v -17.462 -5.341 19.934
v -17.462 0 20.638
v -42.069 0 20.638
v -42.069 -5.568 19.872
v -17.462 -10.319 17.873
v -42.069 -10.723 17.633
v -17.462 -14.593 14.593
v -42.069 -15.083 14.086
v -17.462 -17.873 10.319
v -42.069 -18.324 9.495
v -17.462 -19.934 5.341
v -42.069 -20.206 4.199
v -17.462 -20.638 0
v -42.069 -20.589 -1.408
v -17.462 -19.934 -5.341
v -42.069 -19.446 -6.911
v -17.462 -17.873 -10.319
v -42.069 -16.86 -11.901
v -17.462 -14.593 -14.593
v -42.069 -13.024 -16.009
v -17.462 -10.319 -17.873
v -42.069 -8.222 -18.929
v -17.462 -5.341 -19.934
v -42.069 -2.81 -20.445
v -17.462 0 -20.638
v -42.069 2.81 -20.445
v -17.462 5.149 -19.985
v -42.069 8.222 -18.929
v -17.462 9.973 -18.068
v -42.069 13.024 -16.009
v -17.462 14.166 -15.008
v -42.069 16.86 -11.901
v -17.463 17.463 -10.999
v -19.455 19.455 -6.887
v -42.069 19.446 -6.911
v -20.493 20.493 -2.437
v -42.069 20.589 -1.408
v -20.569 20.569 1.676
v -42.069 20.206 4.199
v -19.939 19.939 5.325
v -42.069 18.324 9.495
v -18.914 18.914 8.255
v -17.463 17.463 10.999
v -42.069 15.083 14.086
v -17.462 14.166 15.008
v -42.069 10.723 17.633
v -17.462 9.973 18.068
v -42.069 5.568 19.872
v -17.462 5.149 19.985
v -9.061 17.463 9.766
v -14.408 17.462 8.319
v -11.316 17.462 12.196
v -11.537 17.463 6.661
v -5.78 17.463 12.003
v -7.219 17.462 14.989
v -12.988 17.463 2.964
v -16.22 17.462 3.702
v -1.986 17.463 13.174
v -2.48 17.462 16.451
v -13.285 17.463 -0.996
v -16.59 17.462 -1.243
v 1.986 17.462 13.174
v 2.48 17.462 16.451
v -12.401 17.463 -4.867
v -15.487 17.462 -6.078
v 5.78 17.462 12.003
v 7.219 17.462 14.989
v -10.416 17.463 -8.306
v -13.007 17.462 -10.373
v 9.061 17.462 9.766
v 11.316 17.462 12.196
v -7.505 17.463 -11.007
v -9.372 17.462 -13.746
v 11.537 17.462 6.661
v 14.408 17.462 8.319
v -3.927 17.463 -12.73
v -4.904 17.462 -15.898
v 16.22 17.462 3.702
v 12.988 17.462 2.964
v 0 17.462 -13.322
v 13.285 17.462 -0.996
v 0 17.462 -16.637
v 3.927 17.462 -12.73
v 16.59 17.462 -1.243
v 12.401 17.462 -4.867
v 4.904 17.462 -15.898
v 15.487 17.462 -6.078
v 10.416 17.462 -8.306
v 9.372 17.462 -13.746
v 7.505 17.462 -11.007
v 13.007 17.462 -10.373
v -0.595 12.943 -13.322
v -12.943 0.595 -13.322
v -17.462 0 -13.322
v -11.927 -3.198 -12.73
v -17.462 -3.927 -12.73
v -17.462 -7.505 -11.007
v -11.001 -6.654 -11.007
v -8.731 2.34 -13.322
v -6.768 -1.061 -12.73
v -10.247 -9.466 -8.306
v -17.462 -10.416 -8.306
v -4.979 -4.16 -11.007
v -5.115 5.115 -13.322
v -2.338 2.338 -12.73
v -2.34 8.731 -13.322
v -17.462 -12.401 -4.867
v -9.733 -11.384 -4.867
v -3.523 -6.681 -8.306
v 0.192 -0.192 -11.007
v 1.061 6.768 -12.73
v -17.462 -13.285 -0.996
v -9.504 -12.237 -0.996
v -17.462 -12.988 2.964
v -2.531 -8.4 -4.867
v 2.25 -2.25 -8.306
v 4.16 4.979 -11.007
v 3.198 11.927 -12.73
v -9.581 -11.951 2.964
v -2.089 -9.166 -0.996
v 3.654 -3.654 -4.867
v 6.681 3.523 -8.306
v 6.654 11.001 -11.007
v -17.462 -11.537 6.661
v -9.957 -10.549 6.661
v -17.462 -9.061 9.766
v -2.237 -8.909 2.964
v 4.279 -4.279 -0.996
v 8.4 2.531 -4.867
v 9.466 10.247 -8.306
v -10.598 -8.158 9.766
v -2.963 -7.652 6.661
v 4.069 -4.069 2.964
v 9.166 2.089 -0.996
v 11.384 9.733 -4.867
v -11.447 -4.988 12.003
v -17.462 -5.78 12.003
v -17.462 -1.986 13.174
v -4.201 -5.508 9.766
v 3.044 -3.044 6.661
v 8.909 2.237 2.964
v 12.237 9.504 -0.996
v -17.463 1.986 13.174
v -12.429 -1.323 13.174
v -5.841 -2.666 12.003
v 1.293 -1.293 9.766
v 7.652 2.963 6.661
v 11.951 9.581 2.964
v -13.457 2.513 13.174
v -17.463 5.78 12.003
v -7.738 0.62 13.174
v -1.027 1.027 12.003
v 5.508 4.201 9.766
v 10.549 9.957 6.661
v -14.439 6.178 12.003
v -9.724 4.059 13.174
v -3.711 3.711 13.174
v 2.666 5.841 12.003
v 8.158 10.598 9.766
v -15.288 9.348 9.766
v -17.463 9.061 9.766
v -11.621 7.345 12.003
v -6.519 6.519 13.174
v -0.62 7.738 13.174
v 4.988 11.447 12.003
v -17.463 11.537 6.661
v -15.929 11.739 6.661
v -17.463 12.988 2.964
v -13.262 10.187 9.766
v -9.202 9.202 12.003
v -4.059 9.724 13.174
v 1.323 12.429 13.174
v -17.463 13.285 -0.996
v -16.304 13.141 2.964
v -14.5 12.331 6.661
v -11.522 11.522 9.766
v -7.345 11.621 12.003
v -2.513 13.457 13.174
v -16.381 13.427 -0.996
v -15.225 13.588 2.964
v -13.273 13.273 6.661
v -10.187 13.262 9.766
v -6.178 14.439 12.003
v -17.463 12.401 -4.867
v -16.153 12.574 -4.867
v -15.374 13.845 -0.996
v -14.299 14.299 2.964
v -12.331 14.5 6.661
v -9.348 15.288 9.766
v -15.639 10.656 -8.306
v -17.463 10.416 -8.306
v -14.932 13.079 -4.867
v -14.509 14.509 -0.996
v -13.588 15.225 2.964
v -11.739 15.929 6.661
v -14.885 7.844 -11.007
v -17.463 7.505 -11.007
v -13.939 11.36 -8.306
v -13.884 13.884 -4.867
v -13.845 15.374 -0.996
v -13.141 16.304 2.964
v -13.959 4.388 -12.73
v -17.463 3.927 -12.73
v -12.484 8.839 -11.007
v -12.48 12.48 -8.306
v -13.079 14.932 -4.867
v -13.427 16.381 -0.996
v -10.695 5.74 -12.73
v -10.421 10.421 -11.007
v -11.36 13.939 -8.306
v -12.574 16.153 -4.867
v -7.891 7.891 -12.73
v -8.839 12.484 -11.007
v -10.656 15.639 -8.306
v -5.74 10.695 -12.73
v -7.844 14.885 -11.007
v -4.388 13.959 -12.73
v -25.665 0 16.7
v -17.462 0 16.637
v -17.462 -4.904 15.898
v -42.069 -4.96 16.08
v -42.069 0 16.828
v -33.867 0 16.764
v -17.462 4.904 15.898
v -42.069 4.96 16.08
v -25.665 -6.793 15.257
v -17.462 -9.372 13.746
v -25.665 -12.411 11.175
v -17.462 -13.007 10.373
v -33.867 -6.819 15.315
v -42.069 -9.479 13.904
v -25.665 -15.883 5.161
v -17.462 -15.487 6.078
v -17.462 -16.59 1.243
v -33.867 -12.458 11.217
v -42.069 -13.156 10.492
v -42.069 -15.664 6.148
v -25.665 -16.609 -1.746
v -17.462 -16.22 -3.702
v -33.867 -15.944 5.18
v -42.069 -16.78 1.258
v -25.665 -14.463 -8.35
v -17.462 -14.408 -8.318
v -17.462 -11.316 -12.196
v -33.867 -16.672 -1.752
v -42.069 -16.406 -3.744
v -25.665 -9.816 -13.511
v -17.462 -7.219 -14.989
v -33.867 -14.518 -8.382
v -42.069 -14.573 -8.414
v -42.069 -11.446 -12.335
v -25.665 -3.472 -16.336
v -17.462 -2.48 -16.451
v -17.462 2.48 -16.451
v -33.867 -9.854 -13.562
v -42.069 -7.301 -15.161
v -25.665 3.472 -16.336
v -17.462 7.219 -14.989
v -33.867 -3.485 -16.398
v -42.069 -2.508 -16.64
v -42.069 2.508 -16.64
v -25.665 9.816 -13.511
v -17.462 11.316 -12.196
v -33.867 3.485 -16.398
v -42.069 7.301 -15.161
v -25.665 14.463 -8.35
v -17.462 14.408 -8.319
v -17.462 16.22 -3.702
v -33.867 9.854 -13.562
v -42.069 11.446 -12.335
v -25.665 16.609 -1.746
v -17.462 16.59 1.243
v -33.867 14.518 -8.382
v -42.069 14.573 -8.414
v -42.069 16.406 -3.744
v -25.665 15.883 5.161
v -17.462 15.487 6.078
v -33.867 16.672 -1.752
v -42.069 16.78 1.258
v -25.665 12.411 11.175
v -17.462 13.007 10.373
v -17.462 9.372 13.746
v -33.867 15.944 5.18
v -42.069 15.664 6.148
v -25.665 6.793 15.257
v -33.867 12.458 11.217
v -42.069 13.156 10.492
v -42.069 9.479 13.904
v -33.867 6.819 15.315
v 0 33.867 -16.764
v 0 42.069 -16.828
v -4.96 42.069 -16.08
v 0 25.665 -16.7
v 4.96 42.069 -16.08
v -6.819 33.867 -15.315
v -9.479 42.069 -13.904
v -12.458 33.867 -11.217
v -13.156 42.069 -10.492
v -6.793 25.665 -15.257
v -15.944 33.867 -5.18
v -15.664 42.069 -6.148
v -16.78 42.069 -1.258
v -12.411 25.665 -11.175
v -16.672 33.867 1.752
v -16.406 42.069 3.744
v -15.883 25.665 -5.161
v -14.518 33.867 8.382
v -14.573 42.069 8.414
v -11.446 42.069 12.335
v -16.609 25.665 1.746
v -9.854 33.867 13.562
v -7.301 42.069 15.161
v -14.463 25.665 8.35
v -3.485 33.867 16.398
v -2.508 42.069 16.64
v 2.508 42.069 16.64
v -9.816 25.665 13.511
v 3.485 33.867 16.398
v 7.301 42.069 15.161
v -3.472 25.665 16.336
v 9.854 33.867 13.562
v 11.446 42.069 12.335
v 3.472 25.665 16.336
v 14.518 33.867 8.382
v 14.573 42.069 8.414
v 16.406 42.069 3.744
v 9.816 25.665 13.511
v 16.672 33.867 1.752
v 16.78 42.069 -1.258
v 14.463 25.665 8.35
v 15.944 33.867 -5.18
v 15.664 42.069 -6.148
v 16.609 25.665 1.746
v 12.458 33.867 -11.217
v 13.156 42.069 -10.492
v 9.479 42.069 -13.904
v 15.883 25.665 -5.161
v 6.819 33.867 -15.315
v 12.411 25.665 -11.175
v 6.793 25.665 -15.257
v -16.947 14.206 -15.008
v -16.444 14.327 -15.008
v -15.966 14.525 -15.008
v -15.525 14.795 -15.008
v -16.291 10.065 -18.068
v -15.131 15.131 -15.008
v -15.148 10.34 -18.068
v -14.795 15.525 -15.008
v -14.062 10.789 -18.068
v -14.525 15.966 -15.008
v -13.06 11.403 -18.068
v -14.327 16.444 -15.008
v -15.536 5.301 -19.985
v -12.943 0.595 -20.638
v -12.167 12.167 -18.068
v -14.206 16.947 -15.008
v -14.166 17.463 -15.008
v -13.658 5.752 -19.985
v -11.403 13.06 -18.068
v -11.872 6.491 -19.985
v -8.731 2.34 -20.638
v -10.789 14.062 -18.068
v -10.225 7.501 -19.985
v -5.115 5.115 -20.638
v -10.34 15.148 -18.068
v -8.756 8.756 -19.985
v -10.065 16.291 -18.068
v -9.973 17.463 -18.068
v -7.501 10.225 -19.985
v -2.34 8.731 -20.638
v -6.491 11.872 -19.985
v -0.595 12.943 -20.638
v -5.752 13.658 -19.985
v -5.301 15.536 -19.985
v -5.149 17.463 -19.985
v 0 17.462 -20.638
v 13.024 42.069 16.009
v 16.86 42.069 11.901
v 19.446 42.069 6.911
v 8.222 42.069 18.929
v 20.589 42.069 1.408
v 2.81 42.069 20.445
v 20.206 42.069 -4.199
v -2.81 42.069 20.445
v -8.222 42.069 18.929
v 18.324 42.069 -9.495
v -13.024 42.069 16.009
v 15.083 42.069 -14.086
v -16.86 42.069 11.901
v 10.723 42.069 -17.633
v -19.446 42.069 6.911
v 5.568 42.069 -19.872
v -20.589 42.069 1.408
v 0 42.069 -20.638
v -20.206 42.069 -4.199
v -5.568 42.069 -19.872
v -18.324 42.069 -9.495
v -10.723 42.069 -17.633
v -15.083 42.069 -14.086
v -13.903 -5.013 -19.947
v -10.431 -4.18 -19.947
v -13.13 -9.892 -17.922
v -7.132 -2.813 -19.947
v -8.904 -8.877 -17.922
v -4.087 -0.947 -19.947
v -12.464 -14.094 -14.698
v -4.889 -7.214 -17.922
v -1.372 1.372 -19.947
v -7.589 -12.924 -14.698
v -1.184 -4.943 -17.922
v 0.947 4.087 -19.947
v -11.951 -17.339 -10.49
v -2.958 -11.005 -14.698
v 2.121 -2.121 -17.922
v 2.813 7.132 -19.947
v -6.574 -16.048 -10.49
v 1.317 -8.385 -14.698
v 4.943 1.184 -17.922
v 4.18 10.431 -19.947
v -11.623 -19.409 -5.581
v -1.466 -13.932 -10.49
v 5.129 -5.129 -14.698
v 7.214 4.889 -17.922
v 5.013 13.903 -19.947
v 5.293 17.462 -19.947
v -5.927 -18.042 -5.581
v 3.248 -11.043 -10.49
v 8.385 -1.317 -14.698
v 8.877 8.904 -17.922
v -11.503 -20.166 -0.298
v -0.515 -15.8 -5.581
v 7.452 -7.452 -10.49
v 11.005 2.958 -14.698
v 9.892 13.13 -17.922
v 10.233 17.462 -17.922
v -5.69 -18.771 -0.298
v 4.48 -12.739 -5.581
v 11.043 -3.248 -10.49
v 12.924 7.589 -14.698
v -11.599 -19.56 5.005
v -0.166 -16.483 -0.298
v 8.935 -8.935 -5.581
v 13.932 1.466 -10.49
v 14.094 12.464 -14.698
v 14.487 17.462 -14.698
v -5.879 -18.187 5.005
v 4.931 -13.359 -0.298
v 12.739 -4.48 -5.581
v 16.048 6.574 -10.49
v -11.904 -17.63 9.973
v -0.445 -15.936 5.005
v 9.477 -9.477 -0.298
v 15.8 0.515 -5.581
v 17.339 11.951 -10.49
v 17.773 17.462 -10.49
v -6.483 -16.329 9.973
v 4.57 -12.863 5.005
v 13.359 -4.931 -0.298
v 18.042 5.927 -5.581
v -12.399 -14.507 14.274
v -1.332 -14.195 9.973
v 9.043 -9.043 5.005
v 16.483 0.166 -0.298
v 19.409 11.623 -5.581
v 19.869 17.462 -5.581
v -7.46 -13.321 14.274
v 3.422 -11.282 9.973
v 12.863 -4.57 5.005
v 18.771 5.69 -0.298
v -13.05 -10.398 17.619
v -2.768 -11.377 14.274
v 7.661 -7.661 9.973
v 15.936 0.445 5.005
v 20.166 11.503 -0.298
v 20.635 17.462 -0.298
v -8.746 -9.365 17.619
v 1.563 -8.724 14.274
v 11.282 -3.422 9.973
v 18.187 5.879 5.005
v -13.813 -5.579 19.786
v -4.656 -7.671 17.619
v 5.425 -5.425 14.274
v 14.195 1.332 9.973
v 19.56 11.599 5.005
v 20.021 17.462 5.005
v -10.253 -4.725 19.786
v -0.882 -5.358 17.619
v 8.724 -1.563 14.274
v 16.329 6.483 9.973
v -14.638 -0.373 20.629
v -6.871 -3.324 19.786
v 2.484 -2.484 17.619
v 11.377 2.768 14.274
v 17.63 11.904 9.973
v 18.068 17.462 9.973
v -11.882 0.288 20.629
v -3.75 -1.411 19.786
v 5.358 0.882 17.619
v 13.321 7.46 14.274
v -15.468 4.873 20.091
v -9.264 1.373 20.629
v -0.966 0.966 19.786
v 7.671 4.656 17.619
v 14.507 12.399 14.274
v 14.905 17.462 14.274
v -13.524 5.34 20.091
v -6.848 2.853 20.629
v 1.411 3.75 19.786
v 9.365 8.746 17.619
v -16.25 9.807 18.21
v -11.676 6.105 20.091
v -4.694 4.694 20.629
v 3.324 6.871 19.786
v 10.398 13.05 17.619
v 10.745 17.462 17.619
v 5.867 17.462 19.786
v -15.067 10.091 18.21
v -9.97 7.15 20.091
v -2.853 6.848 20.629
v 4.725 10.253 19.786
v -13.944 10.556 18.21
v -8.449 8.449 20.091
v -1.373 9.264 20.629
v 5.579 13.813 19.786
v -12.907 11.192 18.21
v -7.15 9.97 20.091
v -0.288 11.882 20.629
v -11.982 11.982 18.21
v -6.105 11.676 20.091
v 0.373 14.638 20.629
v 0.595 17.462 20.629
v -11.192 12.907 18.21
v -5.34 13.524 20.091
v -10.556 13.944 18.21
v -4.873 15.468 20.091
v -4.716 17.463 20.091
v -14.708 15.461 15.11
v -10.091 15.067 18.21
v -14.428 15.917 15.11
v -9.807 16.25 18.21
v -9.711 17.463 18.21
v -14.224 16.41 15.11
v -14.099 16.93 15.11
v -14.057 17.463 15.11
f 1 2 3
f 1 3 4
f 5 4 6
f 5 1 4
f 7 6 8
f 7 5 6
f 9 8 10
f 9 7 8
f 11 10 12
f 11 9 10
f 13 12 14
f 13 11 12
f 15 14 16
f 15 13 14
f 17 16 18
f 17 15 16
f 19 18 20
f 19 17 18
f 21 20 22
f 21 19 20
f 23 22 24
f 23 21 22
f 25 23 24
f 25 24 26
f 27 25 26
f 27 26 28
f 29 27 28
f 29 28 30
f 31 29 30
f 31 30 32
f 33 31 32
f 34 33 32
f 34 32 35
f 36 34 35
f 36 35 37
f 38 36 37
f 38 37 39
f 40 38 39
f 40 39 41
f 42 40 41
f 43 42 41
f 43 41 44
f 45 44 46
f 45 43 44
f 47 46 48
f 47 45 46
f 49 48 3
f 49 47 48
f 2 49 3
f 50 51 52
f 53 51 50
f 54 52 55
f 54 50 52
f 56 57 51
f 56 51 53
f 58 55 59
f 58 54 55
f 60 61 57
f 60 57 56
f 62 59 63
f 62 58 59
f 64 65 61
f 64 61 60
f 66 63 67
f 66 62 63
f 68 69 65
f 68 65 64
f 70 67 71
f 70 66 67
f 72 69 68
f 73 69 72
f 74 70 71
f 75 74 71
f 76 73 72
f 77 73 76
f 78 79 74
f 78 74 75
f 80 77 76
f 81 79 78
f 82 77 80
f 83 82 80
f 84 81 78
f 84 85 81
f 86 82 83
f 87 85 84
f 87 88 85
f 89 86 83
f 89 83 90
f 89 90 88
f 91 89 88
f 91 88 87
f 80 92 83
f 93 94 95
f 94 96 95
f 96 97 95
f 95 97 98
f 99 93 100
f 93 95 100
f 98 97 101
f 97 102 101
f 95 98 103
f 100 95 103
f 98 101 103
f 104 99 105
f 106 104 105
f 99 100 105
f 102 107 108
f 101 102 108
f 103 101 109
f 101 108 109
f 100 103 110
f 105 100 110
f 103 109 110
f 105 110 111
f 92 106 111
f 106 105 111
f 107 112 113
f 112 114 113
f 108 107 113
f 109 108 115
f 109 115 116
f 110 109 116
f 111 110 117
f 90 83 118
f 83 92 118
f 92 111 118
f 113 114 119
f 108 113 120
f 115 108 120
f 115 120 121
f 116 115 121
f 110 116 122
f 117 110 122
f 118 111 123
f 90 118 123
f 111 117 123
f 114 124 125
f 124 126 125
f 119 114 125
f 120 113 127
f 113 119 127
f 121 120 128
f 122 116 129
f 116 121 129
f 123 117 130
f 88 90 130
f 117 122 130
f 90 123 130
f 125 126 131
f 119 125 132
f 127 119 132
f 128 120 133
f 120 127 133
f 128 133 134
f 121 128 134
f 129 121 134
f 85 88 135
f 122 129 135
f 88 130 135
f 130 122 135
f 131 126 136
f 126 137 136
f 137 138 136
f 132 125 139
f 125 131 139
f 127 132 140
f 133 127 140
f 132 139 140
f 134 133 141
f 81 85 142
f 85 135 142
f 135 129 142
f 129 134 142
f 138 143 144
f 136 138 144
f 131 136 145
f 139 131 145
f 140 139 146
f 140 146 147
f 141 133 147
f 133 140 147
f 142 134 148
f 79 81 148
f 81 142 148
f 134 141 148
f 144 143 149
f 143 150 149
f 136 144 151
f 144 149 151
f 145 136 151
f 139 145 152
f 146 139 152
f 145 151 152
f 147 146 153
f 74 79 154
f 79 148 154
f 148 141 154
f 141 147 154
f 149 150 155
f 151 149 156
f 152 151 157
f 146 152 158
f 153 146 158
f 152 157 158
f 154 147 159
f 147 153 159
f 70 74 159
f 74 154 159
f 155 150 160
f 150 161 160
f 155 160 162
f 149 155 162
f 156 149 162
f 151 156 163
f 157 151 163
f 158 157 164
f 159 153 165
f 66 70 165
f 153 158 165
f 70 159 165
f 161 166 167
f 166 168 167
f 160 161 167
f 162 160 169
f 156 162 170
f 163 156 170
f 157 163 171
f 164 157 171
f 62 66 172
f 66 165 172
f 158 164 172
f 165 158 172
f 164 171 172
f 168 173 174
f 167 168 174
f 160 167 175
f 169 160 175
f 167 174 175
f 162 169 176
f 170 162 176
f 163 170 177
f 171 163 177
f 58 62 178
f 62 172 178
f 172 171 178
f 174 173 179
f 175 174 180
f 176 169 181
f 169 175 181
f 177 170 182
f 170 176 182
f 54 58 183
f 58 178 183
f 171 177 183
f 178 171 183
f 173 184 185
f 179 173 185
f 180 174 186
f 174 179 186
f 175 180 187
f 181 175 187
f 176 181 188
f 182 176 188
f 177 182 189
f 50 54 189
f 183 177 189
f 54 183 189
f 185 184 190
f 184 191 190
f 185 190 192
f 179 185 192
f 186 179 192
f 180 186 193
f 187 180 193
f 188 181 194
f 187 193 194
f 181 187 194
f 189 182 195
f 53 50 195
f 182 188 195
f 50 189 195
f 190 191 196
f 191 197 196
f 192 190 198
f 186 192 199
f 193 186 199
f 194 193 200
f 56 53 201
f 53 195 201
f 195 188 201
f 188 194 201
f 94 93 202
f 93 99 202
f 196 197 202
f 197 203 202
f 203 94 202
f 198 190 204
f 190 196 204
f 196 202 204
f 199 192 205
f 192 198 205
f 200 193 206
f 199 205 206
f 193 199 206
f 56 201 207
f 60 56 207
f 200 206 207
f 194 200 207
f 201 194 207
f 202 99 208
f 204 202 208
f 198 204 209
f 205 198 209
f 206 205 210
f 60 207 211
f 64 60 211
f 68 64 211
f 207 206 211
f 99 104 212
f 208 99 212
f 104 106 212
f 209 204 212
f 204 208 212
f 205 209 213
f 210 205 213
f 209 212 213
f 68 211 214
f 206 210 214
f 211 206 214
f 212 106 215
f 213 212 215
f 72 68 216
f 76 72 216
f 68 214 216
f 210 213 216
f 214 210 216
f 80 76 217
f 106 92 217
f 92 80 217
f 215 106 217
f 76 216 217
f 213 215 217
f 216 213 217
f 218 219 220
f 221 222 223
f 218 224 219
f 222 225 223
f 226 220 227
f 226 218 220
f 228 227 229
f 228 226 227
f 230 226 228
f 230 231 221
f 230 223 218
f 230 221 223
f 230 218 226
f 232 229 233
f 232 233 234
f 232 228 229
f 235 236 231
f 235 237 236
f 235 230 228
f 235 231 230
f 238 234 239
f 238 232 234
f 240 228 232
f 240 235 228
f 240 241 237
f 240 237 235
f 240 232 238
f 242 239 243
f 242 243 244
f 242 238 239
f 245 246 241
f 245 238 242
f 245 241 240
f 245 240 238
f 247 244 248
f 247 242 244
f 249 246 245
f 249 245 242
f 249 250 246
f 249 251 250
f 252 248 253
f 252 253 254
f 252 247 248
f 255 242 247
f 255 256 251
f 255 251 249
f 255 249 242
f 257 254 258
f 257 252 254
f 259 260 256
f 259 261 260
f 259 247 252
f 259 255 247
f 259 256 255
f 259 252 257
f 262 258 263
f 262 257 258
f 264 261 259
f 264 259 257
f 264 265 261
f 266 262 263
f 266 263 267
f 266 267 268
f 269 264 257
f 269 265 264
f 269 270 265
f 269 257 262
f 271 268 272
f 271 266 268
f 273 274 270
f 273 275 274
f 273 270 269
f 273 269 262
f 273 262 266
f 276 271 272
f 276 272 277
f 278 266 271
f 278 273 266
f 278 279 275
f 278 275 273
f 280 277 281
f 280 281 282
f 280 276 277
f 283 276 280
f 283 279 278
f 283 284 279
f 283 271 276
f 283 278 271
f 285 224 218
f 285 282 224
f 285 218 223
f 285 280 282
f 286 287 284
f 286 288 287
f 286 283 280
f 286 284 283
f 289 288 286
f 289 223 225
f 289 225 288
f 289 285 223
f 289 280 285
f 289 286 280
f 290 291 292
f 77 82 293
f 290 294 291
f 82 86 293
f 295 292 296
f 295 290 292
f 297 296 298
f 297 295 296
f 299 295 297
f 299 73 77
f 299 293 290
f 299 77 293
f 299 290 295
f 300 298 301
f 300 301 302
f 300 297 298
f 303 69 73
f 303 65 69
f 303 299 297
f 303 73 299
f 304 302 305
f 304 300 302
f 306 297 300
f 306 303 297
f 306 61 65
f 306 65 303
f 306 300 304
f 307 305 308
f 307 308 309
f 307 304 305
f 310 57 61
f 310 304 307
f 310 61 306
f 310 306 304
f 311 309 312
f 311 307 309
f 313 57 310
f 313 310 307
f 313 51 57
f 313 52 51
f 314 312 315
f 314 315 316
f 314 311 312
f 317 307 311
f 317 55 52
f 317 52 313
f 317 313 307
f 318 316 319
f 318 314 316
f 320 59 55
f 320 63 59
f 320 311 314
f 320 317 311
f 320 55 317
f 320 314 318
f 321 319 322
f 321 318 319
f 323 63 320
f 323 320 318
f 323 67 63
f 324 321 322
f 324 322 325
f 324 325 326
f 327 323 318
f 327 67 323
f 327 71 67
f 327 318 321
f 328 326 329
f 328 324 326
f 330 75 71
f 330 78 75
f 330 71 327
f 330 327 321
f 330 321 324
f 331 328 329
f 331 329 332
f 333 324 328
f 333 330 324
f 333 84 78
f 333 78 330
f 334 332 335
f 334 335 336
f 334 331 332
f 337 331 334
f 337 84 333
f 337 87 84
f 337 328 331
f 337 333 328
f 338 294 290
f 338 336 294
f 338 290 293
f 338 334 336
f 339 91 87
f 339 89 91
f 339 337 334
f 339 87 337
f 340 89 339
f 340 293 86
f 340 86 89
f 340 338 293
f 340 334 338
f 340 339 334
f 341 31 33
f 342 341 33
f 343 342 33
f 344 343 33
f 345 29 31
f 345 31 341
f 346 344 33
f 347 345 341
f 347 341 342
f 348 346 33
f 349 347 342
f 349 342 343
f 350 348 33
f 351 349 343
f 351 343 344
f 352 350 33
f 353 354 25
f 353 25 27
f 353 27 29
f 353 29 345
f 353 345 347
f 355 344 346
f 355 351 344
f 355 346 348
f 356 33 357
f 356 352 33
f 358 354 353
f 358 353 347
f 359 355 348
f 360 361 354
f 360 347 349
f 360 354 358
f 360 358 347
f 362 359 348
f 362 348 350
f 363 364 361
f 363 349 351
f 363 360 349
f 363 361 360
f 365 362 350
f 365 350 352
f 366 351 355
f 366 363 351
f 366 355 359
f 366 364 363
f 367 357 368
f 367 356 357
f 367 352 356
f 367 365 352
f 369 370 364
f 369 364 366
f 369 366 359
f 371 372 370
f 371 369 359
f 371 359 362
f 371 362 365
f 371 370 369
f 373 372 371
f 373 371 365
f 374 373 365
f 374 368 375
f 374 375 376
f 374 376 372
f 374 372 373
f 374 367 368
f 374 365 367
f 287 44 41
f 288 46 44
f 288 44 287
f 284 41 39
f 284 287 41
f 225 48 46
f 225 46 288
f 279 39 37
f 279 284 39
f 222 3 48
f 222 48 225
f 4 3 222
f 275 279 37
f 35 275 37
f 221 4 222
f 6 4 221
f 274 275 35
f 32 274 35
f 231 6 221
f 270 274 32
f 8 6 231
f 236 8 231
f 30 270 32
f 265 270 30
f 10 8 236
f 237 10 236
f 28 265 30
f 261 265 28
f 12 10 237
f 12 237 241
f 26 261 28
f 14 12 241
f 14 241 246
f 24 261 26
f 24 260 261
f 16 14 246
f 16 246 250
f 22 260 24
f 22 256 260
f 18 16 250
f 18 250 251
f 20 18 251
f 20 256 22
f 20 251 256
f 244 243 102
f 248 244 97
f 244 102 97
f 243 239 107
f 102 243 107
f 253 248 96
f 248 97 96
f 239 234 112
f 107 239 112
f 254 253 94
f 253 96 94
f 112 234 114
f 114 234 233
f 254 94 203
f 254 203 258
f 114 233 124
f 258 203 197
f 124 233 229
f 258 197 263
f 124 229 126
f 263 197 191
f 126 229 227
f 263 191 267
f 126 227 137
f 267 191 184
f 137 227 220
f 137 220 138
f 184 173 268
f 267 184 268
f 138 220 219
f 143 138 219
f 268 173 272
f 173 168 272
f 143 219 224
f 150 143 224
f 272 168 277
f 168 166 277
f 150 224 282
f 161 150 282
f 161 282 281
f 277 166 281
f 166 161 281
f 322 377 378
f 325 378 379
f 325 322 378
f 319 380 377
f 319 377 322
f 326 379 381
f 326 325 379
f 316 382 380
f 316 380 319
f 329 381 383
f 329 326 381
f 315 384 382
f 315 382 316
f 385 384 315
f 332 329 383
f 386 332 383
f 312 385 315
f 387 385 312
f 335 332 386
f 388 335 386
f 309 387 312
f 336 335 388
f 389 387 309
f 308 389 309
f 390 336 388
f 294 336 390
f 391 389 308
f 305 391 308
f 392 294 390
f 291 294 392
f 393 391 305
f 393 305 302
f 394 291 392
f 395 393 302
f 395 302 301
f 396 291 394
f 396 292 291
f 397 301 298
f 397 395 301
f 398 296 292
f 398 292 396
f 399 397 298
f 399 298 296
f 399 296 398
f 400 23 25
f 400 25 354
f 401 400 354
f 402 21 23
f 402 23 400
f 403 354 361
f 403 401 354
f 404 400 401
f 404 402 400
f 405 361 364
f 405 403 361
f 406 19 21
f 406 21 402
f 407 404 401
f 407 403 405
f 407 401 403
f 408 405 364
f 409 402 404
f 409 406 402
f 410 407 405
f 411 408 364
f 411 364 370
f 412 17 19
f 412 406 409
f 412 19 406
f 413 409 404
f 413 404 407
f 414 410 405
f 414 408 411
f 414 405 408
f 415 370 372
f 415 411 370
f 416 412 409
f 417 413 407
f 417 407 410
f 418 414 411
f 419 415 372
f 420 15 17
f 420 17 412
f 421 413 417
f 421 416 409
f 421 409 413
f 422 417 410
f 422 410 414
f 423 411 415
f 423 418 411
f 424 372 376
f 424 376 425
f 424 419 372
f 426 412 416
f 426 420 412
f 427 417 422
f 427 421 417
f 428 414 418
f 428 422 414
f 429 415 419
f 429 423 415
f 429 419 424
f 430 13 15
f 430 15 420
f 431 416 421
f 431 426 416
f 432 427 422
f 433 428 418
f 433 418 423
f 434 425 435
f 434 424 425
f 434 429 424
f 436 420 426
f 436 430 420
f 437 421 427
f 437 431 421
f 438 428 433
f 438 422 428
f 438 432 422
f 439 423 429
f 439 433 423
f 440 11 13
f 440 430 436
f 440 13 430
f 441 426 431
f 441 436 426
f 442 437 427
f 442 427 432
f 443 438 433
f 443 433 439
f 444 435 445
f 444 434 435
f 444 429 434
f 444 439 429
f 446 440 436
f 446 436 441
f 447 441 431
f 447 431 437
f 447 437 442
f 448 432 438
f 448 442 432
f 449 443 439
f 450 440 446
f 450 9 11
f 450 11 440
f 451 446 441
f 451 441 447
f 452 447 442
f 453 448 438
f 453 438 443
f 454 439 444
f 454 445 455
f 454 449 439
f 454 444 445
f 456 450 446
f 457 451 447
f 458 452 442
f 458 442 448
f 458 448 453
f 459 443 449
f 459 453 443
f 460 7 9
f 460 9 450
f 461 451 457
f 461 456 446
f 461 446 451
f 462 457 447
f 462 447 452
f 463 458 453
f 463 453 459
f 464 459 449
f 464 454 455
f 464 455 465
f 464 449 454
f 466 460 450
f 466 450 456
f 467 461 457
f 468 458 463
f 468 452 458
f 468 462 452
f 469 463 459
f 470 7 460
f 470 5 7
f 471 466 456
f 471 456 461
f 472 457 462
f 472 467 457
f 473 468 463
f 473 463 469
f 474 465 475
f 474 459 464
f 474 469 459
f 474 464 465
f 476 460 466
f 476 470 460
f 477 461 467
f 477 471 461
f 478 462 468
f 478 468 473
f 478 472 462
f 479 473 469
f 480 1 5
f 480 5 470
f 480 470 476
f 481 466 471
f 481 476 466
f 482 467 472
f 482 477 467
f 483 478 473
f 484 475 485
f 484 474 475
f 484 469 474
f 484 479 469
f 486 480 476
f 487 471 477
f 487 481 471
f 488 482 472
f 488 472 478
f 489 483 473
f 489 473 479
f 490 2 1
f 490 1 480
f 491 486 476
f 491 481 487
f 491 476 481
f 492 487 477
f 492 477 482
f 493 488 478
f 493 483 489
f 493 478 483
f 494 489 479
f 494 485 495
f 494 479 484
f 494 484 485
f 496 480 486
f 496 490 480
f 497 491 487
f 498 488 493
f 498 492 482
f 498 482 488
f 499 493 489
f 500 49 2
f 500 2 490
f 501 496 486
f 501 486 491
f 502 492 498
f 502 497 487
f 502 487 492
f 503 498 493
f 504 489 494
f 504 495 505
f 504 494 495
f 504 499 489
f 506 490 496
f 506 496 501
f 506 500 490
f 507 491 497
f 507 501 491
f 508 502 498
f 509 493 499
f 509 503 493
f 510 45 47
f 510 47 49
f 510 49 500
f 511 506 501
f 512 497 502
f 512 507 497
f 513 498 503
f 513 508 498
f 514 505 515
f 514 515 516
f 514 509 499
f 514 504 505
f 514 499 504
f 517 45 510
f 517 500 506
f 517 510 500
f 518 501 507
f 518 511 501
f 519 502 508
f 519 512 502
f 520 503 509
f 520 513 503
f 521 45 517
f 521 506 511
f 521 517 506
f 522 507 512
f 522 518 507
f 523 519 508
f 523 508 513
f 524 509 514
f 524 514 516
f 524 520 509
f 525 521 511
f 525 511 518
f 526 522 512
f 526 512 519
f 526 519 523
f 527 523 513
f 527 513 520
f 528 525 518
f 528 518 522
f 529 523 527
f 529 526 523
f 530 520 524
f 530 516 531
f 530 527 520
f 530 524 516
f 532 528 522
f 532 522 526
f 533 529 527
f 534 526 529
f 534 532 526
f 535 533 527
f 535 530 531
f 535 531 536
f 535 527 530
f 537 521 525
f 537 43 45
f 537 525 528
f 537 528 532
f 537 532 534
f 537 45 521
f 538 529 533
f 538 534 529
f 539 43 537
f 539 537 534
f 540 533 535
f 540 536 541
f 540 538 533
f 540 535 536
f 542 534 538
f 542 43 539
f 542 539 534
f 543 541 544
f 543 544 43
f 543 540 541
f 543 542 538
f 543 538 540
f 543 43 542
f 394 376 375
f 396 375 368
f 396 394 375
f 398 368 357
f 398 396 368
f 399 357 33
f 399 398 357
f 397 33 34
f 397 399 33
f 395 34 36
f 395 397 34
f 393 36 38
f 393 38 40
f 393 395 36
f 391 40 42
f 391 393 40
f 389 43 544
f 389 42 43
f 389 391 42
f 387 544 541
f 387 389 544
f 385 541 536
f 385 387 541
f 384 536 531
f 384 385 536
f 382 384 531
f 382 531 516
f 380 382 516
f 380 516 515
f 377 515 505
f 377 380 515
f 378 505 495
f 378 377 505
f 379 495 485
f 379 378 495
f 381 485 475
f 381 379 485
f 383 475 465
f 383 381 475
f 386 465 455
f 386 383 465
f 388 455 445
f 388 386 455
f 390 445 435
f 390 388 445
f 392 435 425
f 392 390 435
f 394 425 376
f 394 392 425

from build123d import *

# Parameters (mm, degrees)
SKETCH3_R   = 20.6375
SKETCH3_R_2 = 13.3223


with BuildPart() as part:
    # Sketch1 → Revolve1 (revolve)
    with BuildSketch(Plane.XY):
        Polygon((-42.06875, -20.6375), (-17.4625, -20.6375), (-17.4625, -16.637), (-42.06875, -16.8275), align=None)
    revolve(axis=Axis((-42.06875, 0, 0), (1, 0, 0)))


with BuildPart() as body_2:
    # Sketch2 → Revolve2 (revolve)
    with BuildSketch(Plane.XY):
        Polygon((16.8275, 42.06875), (16.637, 17.4625), (20.6375, 17.4625), (20.6375, 42.06875), align=None)
    revolve(axis=Axis((0, 0, 0), (0, 1, 0)))


with BuildPart() as sweep1_tool:
    # Sweep1: sweep along a path in Sketch4
    with BuildLine(Plane.XY) as sweep1_path:
        ThreePointArc((-17.4625, 0), (-5.114648, 5.114648), (0, 17.4625))
    # Sketch3 → Sweep1 (sweep)
    with BuildSketch(Plane(origin=(-17.4625, 0, 0), x_dir=(0, 0, -1), z_dir=(1, 0, 0))):
        Circle(SKETCH3_R)
        Circle(SKETCH3_R_2, mode=Mode.SUBTRACT)
    sweep(path=sweep1_path.line)


with BuildPart() as part_1:
    add(part.part)


with BuildPart() as part_2:
    # Sweep1: joined with sweep1_tool
    add(part_1.part.fuse(sweep1_tool.part, body_2.part, tol=0.00001))


solid = part_2.part
